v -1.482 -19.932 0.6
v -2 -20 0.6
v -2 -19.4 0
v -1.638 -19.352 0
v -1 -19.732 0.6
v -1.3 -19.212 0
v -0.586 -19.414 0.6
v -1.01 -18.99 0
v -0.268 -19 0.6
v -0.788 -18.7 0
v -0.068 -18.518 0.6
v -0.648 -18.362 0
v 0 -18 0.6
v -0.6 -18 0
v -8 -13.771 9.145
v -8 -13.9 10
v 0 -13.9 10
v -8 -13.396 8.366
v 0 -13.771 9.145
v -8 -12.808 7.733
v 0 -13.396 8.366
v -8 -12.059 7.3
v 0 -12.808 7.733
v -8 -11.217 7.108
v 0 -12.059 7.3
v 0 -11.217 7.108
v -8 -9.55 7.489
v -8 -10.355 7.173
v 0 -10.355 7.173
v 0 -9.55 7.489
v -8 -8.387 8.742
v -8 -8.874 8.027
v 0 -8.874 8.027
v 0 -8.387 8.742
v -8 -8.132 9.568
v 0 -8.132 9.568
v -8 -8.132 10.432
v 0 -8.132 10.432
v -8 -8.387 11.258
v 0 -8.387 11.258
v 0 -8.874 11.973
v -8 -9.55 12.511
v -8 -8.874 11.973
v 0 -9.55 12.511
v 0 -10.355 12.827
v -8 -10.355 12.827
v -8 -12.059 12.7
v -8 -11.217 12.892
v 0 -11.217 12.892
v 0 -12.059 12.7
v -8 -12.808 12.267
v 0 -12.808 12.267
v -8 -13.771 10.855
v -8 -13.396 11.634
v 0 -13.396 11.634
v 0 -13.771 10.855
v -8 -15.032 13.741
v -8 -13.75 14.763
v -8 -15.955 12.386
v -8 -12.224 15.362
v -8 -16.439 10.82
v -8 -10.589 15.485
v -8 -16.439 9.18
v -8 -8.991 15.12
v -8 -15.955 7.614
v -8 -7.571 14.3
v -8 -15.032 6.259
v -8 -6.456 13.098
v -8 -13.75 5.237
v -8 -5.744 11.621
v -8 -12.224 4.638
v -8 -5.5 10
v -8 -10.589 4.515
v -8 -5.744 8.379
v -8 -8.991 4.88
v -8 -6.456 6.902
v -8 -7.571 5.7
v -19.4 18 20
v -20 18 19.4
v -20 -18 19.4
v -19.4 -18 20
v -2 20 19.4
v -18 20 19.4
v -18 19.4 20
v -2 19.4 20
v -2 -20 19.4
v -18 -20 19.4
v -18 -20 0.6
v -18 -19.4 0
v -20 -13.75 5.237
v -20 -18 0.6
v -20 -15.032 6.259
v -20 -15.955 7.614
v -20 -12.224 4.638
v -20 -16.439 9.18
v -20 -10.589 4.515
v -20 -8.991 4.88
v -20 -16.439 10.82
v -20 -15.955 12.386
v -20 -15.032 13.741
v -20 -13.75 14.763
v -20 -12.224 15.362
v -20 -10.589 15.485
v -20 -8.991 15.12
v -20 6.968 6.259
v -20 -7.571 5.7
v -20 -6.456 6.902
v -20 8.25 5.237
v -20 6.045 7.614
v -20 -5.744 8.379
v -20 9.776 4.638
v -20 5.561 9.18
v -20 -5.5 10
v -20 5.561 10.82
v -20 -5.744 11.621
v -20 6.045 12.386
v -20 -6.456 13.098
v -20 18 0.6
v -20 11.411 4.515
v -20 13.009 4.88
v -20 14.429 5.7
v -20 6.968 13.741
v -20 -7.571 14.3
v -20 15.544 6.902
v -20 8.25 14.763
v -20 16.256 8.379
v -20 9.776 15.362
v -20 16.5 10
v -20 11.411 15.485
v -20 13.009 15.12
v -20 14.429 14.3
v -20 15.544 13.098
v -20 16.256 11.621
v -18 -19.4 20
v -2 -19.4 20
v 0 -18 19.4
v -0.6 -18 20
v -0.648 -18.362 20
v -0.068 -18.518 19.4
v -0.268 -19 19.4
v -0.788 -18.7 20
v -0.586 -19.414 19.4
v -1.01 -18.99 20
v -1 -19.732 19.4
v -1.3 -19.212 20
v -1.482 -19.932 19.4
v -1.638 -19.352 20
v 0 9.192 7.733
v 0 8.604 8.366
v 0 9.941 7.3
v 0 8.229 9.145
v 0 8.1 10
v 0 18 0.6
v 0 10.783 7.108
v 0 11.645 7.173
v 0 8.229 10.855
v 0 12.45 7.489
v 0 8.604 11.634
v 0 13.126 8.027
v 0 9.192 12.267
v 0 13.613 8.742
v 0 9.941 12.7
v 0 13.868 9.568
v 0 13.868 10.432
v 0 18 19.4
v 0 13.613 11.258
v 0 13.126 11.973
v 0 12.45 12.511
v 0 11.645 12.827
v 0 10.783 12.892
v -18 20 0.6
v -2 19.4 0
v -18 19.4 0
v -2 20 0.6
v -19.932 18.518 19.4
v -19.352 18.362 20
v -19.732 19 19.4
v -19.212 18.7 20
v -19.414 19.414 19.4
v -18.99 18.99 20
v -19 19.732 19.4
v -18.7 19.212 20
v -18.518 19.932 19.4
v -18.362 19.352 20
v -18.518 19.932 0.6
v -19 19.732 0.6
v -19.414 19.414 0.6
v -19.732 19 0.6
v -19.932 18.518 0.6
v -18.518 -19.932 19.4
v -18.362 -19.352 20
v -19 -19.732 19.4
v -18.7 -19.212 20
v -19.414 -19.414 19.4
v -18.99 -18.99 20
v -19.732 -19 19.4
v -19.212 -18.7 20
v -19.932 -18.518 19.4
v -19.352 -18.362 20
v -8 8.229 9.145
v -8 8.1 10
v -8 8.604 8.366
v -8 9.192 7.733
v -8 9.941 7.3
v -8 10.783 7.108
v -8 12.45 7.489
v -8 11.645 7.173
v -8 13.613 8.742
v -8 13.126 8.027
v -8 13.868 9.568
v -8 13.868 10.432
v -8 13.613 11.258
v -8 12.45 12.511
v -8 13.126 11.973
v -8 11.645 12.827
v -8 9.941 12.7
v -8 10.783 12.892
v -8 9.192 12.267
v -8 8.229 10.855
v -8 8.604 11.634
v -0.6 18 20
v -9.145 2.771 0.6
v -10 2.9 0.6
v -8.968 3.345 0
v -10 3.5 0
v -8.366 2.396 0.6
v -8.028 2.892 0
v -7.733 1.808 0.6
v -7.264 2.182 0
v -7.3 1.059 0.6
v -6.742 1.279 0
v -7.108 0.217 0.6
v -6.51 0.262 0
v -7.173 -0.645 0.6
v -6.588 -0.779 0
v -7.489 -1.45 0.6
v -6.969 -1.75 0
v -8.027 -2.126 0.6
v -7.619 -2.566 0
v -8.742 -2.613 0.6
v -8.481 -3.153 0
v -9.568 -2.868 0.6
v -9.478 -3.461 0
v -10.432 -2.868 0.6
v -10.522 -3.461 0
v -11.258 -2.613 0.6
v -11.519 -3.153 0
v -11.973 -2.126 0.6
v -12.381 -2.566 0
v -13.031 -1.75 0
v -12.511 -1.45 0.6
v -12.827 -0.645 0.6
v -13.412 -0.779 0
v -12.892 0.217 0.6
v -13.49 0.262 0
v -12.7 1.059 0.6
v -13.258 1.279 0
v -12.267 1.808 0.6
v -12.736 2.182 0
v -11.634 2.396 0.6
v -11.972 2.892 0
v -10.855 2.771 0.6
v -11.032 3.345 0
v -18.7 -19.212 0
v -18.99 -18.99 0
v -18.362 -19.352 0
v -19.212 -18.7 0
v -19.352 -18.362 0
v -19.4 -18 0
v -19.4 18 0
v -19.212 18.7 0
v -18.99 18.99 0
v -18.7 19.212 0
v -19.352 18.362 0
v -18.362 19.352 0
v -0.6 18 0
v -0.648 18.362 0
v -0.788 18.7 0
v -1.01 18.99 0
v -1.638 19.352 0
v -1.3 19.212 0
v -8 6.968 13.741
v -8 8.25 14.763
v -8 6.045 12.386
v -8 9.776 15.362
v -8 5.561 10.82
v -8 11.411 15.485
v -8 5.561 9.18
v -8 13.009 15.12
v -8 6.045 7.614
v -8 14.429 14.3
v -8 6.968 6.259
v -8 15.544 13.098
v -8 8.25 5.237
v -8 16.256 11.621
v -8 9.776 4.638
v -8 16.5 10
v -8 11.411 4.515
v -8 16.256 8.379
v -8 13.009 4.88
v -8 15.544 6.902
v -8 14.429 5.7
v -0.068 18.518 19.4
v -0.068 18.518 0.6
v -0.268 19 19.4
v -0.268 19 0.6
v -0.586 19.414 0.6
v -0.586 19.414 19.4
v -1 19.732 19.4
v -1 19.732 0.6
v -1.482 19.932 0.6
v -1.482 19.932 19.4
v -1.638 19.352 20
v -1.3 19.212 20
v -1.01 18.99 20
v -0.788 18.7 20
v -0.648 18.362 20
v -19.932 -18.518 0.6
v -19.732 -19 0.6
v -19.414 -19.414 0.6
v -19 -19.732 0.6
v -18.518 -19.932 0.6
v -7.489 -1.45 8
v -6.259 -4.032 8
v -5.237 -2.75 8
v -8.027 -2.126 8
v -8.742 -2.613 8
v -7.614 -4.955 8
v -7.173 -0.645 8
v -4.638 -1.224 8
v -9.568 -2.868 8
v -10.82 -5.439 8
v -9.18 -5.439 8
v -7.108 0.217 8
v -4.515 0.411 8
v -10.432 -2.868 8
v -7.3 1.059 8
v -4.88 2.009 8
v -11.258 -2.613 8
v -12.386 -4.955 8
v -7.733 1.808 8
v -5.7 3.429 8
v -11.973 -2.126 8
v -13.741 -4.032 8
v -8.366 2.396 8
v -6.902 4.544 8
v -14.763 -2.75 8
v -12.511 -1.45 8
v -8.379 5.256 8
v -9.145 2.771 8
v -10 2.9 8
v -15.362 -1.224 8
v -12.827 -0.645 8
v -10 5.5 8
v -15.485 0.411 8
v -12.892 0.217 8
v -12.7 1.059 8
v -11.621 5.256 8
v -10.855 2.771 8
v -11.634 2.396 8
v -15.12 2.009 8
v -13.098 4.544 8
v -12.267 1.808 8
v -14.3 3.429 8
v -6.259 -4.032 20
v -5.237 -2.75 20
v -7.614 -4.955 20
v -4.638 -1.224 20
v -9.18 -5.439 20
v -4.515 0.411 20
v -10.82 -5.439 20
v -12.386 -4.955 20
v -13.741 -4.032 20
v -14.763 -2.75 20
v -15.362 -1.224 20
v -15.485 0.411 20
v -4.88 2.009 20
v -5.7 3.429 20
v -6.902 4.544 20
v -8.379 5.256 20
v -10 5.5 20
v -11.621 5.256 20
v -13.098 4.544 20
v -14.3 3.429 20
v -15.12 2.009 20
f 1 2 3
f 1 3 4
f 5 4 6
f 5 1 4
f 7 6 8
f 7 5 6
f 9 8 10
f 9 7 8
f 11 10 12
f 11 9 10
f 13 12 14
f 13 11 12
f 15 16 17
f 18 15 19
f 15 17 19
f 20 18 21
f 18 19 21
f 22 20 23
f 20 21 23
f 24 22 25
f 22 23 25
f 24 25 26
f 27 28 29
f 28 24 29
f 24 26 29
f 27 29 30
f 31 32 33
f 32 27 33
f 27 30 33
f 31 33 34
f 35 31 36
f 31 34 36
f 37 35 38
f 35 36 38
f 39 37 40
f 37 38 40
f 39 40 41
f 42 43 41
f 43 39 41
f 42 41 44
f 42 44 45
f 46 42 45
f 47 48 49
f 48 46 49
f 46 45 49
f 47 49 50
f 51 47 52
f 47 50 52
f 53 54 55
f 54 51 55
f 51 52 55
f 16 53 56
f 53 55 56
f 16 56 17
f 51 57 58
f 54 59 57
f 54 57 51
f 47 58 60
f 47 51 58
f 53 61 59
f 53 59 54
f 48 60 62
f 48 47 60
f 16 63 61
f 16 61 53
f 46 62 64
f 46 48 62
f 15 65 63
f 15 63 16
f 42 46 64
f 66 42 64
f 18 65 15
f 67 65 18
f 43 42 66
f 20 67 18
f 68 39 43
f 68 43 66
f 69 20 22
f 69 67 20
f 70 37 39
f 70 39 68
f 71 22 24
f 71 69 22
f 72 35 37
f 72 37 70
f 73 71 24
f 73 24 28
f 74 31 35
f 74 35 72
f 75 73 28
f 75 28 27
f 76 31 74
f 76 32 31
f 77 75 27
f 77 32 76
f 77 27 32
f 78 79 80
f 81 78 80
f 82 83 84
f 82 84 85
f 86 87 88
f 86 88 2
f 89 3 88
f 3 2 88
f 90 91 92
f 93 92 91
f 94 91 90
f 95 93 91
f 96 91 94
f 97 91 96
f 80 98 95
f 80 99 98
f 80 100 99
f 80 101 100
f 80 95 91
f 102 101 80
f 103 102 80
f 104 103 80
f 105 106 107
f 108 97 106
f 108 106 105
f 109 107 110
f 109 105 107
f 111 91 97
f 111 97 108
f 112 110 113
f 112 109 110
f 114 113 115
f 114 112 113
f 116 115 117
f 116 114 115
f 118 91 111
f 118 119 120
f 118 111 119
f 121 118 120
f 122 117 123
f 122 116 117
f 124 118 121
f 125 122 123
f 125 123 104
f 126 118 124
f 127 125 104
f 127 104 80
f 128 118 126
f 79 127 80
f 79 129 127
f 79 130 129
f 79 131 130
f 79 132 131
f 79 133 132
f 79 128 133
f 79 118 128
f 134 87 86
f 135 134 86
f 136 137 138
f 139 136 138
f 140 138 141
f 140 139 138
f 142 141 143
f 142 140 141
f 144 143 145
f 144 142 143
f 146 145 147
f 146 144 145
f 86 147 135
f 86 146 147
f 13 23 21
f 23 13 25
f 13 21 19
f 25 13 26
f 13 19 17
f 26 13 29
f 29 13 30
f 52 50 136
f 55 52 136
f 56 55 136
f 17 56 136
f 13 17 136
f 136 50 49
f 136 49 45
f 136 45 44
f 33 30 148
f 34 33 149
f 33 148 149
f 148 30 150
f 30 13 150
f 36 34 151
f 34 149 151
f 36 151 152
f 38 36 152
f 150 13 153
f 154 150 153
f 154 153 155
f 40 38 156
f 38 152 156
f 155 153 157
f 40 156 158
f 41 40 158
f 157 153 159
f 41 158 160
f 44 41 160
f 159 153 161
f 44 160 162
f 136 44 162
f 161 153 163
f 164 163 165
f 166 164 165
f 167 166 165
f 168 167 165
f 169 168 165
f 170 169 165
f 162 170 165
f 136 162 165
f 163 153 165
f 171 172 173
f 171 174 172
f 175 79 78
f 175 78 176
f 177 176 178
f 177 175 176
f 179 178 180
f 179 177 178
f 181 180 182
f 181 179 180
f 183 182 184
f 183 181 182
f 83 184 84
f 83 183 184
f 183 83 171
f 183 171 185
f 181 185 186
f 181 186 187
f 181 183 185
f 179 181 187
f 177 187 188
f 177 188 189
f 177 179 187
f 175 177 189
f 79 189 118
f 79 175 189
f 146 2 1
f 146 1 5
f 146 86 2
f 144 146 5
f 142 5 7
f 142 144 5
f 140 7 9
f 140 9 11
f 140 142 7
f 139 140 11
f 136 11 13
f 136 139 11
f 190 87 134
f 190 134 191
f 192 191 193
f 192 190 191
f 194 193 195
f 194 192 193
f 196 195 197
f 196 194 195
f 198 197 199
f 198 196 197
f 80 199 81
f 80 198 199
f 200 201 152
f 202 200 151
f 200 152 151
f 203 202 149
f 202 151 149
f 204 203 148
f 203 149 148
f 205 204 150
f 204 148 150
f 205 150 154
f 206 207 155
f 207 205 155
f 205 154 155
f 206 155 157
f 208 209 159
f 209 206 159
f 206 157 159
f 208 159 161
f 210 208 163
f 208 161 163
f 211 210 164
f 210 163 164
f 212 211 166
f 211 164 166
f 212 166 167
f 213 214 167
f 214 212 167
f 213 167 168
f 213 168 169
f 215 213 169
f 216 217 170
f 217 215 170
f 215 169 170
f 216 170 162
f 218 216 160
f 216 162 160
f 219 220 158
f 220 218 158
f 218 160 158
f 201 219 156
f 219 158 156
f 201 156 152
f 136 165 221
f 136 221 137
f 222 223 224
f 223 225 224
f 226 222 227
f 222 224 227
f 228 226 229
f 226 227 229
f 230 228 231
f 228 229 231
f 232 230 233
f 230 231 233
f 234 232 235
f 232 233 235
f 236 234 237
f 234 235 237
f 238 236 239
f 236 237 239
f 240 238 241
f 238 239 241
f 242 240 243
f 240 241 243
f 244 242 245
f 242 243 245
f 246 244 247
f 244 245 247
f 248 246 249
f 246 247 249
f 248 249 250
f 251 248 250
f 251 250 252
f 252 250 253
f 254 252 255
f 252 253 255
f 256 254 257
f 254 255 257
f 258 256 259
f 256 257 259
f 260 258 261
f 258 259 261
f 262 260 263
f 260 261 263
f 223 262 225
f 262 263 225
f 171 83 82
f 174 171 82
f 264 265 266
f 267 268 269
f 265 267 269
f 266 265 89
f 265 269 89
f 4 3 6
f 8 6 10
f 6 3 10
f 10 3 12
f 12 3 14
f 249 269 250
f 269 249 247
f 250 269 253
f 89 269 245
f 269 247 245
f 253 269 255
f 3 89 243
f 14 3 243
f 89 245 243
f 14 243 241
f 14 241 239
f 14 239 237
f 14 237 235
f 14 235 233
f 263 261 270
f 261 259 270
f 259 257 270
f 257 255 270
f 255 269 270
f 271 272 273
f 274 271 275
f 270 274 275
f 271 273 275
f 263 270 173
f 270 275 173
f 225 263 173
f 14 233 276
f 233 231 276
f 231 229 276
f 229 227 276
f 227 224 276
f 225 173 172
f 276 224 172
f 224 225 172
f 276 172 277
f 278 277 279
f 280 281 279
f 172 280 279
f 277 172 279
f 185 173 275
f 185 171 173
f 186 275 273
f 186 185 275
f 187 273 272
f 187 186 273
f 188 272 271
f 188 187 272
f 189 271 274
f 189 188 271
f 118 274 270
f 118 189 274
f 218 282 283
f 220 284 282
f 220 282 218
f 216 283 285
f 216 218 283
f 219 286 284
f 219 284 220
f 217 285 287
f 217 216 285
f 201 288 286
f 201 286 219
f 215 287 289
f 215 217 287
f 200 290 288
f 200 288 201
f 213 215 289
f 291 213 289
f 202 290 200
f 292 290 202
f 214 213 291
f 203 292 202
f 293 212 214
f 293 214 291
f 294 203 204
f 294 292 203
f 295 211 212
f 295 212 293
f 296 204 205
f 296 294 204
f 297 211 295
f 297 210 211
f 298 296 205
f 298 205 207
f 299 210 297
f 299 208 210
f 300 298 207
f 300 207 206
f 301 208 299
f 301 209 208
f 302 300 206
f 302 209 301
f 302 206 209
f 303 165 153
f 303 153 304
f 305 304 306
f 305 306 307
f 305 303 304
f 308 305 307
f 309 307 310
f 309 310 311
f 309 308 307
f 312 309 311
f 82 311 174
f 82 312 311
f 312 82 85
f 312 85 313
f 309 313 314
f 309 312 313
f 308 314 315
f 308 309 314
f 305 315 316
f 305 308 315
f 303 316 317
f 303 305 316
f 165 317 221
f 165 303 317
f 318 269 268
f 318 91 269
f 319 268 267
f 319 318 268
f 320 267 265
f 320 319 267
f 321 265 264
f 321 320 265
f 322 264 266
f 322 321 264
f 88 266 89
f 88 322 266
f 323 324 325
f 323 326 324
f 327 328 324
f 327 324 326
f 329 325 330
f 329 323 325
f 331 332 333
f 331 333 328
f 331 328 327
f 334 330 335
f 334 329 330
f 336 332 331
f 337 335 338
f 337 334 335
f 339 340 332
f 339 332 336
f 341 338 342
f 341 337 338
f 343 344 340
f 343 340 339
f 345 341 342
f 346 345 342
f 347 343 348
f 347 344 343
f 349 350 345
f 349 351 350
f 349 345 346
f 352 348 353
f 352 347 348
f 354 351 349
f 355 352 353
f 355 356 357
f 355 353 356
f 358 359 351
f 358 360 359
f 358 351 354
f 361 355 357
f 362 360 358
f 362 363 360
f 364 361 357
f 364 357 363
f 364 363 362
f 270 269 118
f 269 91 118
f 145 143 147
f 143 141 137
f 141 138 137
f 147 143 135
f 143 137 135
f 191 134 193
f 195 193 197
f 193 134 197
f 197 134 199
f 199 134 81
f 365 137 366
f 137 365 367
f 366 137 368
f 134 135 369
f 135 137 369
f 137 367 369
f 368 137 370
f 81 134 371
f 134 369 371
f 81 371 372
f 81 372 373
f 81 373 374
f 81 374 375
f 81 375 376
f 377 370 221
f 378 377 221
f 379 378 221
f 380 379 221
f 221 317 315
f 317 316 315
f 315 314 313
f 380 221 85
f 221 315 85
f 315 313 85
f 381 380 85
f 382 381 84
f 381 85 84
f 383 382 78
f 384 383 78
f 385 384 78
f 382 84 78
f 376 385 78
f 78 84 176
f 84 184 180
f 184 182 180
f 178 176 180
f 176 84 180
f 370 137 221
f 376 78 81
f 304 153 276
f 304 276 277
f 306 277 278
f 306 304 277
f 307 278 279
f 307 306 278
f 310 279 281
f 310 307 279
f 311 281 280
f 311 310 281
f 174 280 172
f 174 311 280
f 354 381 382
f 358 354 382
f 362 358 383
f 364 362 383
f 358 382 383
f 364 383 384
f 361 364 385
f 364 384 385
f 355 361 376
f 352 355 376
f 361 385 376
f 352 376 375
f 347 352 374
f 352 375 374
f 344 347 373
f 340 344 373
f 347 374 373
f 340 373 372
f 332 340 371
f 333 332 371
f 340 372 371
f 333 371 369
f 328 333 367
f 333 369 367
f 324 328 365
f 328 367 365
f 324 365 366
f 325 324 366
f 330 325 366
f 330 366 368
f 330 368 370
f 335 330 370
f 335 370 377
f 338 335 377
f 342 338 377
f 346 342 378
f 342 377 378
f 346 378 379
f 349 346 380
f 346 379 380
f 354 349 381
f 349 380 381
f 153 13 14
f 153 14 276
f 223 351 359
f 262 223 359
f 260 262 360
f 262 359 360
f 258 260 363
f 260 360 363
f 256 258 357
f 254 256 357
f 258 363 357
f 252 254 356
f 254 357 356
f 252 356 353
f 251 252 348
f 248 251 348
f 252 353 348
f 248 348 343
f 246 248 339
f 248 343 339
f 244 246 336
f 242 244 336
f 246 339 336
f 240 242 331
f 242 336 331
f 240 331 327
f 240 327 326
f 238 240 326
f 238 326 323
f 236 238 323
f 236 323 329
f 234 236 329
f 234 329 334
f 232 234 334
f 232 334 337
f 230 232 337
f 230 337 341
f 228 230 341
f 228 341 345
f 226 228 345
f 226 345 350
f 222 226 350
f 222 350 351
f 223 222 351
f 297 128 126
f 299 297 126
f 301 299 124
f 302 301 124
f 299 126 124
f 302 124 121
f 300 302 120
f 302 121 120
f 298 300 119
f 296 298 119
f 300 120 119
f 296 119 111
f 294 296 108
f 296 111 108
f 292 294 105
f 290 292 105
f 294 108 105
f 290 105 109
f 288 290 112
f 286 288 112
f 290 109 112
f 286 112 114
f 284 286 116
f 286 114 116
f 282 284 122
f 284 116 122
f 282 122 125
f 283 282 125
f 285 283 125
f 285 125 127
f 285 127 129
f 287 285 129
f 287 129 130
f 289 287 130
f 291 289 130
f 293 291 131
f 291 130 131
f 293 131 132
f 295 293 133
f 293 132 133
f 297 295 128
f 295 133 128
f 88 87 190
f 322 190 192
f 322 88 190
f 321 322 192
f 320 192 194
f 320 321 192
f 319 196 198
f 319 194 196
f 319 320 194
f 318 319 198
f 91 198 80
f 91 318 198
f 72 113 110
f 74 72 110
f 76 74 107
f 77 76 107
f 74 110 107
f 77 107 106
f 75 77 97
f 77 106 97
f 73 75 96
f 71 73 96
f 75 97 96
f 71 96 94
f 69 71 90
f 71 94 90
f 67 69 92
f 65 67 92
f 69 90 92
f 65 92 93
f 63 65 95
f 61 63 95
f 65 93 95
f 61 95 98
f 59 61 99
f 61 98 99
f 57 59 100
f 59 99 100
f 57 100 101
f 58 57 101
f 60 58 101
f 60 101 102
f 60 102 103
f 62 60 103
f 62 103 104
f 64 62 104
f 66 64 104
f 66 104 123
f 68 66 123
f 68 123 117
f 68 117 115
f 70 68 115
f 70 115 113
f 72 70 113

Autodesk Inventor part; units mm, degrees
ref_plane "YZ Plane" through (0, 0, 0) normal (1, 0, 0) x (0, 1, 0)
ref_plane "XZ Plane" through (0, 0, 0) normal (0, 1, 0) x (-1, 0, 0)
ref_plane "XY Plane" through (0, 0, 0) normal (0, 0, 1) x (1, 0, 0)
sketch "Sketch7" plane through (0, 0, 0) normal (0, 0, 1) x (1, 0, 0)
  line L0 (0, 0) -> (0, 20)
  line L1 (-20, 0) -> (0, 0)
  line L2 (-20, 8) -> (-8, 8)
  line L3 (-8, 8) -> (-8, 20)
  line L4 (-8, 8) -> (0, 0)
  line L5 (0, 20) -> (-8, 20)
  line L6 (-20, 0) -> (-20, 8)
  dimension "d40" = 20
  dimension "d43" = 45
  dimension "d44" = 8
extrude "Extrusion4" add sketch "Sketch7" along normal mid plane 40
sketch "Sketch8" plane through (-8, 8, 20) normal (-1, 0, 0) x (0, 0, 1)
  line L0 (-31, 2) -> (-9, 2) construction
  line L1 (-40, -8) -> (0, -8) projected
  point P0 (-20, -8)
  point P1 (-20, 2)
  point P2 (-20, -8)
  dimension "d45" = 10
  dimension "d53" = 22
hole "Hole3" at (-8, 10, -11) at (-8, 10, 11) direction (1, 0, 0) diameter 5.8 end through all
sketch "Sketch9" plane through (-20, 0, 20) normal (0, -1, 0) x (1, 0, 0)
  line L0 (20, 0) -> (20, -40) projected
  point P0 (20, -20)
  point P1 (10, -20)
  point P2 (20, -20)
  point P3 (20, -20)
  dimension "d54" = 10
hole "Hole4" at (-10, 0, 0) direction (0, 1, 0) diameter 5.8 end through all
sketch "Sketch10" plane through (0, 0, 0) normal (0, 0, 1) x (1, 0, 0)
  line L0 (0, 20) -> (0, 0) projected
  line L1 (0, 0) -> (-20, 0) projected
  line L2 (-20, 0) -> (-20, 20)
  line L3 (-20, 20) -> (0, 20)
  line L4 (0, 20) -> (0, 0) projected
  line L5 (0, 0) -> (-20, 0) projected
  line L6 (-20, 0) -> (-20, 8) projected
  line L7 (-20, 8) -> (-8, 8) projected
  line L8 (-8, 8) -> (-8, 20) projected
  line L9 (-8, 20) -> (0, 20) projected
extrude "Extrusion5" add sketch "Sketch10" along normal mid plane 40 contours L8 L7 L2 L3
sketch "Sketch11" plane through (-10, 8, 0) normal (0, -1, 0) x (0, 0, 1)
  circle A0 centre (0, 0) radius 2.9 projected
  point P0 (0, -10)
  point P1 (0, 0)
hole "Hole5" at (-10, 8, 0) direction (0, 1, 0) diameter 11 end through all
sketch "Sketch12" plane through (-8, 10, 11) normal (1, 0, 0) x (0, 0, -1)
  circle A0 centre (22, 0) radius 2.9 projected
  circle A1 centre (0, 0) radius 2.9 projected
  point P0 (11, -10)
hole "Hole6" at (-8, 10, -11) at (-8, 10, 11) direction (-1, 0, 0) diameter 11 end through all
fillet "Fillet4" radius 2 4 edges at (0, 10, 20) (-20, 10, 20) (0, 10, -20) (-20, 10, -20)
chamfer "Chamfer3" distance 0.6 angle 45 14 edges at (-20, 20, 0) (-10, 20, 20) (-0.5858, 20, 19.4142) (0, 20, 0) (-0.5858, 20, -19.4142) (-10, 20, -20) (-20, 0, 0) (-19.4142, 0, 19.4142) (-10, 0, 20) (-0.5858, 0, 19.4142) (0, 0, 0) (-0.5858, 0, -19.4142) (-10, 0, -20) (-19.4142, 0, -19.4142)
chamfer "Chamfer4" distance 0.6 angle 45 1 edges at (-10, 0, 2.9)
move or copy body "Move Body1" bodies to move or copy 1 copy no rotation origin (0, 0, 0) rotation axis (1, 0, 0) rotation angle 90
properties part number "2020-perp-connecdtor"
